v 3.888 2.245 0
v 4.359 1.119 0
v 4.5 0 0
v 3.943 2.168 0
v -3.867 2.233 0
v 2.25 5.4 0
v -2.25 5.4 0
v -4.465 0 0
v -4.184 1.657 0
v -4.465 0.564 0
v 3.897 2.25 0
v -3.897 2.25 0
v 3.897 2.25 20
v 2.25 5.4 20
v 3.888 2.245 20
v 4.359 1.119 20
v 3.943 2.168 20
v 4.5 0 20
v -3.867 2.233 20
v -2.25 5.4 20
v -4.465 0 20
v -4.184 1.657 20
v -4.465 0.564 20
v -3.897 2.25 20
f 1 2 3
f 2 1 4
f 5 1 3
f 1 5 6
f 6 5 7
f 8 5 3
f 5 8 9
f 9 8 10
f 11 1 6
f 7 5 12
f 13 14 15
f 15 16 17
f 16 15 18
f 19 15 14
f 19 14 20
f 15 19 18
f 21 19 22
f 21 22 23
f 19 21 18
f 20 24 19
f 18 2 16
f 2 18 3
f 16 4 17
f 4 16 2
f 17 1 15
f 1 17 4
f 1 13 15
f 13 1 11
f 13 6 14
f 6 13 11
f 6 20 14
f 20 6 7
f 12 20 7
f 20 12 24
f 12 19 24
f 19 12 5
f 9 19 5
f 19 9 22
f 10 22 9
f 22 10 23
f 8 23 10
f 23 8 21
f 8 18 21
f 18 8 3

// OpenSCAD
// miPrinter
// https://github.com/3DprintFIT/miPrinter
// Teardrop
// GNU GPL v3
// Josef Průša

teardropcentering2();

module teardrop (r=4.5,h=20)
{
	rotate([-270,0,90])
	linear_extrude(height=h)
	{
		circle(r=r, $fn = 25);
		polygon(points=[[0,0],[r*cos(30),r*sin(30)],[0.5*r,r],[-0.5*r,r],[-r*cos(30),r*sin(30)]],
				paths=[[0,1,2,3,4]]);
	}
}

module teardropcentering (r=4.5,h=20)
{
	rotate([-270,0,90])
	linear_extrude(height=h)
	{
		circle(r=r, $fn = 25);
		polygon(points=[[0,0],[r*cos(30),r*sin(30)],[0.5*r,1.2*r],[-0.5*r,1.2*r],[-r*cos(30),r*sin(30)]],
				paths=[[0,1,2,3,4]]);
	}
}

module teardropcentering2 (r=4.5,h=20)
{
	//rotate([-270,0,90])
	difference(){
	linear_extrude(height=h)
	{
		circle(r=r, $fn = 25);
		polygon(points=[[0,0],[r*cos(30),r*sin(30)],[0.5*r,1.2*r],[-0.5*r,1.2*r],[-r*cos(30),r*sin(30)]],
				paths=[[0,1,2,3,4]]);
	}
	translate(v = [-1.5*r, -1.5*r,-1])cube(size =[3*r,1.5*r,h+2]);
	}
}
